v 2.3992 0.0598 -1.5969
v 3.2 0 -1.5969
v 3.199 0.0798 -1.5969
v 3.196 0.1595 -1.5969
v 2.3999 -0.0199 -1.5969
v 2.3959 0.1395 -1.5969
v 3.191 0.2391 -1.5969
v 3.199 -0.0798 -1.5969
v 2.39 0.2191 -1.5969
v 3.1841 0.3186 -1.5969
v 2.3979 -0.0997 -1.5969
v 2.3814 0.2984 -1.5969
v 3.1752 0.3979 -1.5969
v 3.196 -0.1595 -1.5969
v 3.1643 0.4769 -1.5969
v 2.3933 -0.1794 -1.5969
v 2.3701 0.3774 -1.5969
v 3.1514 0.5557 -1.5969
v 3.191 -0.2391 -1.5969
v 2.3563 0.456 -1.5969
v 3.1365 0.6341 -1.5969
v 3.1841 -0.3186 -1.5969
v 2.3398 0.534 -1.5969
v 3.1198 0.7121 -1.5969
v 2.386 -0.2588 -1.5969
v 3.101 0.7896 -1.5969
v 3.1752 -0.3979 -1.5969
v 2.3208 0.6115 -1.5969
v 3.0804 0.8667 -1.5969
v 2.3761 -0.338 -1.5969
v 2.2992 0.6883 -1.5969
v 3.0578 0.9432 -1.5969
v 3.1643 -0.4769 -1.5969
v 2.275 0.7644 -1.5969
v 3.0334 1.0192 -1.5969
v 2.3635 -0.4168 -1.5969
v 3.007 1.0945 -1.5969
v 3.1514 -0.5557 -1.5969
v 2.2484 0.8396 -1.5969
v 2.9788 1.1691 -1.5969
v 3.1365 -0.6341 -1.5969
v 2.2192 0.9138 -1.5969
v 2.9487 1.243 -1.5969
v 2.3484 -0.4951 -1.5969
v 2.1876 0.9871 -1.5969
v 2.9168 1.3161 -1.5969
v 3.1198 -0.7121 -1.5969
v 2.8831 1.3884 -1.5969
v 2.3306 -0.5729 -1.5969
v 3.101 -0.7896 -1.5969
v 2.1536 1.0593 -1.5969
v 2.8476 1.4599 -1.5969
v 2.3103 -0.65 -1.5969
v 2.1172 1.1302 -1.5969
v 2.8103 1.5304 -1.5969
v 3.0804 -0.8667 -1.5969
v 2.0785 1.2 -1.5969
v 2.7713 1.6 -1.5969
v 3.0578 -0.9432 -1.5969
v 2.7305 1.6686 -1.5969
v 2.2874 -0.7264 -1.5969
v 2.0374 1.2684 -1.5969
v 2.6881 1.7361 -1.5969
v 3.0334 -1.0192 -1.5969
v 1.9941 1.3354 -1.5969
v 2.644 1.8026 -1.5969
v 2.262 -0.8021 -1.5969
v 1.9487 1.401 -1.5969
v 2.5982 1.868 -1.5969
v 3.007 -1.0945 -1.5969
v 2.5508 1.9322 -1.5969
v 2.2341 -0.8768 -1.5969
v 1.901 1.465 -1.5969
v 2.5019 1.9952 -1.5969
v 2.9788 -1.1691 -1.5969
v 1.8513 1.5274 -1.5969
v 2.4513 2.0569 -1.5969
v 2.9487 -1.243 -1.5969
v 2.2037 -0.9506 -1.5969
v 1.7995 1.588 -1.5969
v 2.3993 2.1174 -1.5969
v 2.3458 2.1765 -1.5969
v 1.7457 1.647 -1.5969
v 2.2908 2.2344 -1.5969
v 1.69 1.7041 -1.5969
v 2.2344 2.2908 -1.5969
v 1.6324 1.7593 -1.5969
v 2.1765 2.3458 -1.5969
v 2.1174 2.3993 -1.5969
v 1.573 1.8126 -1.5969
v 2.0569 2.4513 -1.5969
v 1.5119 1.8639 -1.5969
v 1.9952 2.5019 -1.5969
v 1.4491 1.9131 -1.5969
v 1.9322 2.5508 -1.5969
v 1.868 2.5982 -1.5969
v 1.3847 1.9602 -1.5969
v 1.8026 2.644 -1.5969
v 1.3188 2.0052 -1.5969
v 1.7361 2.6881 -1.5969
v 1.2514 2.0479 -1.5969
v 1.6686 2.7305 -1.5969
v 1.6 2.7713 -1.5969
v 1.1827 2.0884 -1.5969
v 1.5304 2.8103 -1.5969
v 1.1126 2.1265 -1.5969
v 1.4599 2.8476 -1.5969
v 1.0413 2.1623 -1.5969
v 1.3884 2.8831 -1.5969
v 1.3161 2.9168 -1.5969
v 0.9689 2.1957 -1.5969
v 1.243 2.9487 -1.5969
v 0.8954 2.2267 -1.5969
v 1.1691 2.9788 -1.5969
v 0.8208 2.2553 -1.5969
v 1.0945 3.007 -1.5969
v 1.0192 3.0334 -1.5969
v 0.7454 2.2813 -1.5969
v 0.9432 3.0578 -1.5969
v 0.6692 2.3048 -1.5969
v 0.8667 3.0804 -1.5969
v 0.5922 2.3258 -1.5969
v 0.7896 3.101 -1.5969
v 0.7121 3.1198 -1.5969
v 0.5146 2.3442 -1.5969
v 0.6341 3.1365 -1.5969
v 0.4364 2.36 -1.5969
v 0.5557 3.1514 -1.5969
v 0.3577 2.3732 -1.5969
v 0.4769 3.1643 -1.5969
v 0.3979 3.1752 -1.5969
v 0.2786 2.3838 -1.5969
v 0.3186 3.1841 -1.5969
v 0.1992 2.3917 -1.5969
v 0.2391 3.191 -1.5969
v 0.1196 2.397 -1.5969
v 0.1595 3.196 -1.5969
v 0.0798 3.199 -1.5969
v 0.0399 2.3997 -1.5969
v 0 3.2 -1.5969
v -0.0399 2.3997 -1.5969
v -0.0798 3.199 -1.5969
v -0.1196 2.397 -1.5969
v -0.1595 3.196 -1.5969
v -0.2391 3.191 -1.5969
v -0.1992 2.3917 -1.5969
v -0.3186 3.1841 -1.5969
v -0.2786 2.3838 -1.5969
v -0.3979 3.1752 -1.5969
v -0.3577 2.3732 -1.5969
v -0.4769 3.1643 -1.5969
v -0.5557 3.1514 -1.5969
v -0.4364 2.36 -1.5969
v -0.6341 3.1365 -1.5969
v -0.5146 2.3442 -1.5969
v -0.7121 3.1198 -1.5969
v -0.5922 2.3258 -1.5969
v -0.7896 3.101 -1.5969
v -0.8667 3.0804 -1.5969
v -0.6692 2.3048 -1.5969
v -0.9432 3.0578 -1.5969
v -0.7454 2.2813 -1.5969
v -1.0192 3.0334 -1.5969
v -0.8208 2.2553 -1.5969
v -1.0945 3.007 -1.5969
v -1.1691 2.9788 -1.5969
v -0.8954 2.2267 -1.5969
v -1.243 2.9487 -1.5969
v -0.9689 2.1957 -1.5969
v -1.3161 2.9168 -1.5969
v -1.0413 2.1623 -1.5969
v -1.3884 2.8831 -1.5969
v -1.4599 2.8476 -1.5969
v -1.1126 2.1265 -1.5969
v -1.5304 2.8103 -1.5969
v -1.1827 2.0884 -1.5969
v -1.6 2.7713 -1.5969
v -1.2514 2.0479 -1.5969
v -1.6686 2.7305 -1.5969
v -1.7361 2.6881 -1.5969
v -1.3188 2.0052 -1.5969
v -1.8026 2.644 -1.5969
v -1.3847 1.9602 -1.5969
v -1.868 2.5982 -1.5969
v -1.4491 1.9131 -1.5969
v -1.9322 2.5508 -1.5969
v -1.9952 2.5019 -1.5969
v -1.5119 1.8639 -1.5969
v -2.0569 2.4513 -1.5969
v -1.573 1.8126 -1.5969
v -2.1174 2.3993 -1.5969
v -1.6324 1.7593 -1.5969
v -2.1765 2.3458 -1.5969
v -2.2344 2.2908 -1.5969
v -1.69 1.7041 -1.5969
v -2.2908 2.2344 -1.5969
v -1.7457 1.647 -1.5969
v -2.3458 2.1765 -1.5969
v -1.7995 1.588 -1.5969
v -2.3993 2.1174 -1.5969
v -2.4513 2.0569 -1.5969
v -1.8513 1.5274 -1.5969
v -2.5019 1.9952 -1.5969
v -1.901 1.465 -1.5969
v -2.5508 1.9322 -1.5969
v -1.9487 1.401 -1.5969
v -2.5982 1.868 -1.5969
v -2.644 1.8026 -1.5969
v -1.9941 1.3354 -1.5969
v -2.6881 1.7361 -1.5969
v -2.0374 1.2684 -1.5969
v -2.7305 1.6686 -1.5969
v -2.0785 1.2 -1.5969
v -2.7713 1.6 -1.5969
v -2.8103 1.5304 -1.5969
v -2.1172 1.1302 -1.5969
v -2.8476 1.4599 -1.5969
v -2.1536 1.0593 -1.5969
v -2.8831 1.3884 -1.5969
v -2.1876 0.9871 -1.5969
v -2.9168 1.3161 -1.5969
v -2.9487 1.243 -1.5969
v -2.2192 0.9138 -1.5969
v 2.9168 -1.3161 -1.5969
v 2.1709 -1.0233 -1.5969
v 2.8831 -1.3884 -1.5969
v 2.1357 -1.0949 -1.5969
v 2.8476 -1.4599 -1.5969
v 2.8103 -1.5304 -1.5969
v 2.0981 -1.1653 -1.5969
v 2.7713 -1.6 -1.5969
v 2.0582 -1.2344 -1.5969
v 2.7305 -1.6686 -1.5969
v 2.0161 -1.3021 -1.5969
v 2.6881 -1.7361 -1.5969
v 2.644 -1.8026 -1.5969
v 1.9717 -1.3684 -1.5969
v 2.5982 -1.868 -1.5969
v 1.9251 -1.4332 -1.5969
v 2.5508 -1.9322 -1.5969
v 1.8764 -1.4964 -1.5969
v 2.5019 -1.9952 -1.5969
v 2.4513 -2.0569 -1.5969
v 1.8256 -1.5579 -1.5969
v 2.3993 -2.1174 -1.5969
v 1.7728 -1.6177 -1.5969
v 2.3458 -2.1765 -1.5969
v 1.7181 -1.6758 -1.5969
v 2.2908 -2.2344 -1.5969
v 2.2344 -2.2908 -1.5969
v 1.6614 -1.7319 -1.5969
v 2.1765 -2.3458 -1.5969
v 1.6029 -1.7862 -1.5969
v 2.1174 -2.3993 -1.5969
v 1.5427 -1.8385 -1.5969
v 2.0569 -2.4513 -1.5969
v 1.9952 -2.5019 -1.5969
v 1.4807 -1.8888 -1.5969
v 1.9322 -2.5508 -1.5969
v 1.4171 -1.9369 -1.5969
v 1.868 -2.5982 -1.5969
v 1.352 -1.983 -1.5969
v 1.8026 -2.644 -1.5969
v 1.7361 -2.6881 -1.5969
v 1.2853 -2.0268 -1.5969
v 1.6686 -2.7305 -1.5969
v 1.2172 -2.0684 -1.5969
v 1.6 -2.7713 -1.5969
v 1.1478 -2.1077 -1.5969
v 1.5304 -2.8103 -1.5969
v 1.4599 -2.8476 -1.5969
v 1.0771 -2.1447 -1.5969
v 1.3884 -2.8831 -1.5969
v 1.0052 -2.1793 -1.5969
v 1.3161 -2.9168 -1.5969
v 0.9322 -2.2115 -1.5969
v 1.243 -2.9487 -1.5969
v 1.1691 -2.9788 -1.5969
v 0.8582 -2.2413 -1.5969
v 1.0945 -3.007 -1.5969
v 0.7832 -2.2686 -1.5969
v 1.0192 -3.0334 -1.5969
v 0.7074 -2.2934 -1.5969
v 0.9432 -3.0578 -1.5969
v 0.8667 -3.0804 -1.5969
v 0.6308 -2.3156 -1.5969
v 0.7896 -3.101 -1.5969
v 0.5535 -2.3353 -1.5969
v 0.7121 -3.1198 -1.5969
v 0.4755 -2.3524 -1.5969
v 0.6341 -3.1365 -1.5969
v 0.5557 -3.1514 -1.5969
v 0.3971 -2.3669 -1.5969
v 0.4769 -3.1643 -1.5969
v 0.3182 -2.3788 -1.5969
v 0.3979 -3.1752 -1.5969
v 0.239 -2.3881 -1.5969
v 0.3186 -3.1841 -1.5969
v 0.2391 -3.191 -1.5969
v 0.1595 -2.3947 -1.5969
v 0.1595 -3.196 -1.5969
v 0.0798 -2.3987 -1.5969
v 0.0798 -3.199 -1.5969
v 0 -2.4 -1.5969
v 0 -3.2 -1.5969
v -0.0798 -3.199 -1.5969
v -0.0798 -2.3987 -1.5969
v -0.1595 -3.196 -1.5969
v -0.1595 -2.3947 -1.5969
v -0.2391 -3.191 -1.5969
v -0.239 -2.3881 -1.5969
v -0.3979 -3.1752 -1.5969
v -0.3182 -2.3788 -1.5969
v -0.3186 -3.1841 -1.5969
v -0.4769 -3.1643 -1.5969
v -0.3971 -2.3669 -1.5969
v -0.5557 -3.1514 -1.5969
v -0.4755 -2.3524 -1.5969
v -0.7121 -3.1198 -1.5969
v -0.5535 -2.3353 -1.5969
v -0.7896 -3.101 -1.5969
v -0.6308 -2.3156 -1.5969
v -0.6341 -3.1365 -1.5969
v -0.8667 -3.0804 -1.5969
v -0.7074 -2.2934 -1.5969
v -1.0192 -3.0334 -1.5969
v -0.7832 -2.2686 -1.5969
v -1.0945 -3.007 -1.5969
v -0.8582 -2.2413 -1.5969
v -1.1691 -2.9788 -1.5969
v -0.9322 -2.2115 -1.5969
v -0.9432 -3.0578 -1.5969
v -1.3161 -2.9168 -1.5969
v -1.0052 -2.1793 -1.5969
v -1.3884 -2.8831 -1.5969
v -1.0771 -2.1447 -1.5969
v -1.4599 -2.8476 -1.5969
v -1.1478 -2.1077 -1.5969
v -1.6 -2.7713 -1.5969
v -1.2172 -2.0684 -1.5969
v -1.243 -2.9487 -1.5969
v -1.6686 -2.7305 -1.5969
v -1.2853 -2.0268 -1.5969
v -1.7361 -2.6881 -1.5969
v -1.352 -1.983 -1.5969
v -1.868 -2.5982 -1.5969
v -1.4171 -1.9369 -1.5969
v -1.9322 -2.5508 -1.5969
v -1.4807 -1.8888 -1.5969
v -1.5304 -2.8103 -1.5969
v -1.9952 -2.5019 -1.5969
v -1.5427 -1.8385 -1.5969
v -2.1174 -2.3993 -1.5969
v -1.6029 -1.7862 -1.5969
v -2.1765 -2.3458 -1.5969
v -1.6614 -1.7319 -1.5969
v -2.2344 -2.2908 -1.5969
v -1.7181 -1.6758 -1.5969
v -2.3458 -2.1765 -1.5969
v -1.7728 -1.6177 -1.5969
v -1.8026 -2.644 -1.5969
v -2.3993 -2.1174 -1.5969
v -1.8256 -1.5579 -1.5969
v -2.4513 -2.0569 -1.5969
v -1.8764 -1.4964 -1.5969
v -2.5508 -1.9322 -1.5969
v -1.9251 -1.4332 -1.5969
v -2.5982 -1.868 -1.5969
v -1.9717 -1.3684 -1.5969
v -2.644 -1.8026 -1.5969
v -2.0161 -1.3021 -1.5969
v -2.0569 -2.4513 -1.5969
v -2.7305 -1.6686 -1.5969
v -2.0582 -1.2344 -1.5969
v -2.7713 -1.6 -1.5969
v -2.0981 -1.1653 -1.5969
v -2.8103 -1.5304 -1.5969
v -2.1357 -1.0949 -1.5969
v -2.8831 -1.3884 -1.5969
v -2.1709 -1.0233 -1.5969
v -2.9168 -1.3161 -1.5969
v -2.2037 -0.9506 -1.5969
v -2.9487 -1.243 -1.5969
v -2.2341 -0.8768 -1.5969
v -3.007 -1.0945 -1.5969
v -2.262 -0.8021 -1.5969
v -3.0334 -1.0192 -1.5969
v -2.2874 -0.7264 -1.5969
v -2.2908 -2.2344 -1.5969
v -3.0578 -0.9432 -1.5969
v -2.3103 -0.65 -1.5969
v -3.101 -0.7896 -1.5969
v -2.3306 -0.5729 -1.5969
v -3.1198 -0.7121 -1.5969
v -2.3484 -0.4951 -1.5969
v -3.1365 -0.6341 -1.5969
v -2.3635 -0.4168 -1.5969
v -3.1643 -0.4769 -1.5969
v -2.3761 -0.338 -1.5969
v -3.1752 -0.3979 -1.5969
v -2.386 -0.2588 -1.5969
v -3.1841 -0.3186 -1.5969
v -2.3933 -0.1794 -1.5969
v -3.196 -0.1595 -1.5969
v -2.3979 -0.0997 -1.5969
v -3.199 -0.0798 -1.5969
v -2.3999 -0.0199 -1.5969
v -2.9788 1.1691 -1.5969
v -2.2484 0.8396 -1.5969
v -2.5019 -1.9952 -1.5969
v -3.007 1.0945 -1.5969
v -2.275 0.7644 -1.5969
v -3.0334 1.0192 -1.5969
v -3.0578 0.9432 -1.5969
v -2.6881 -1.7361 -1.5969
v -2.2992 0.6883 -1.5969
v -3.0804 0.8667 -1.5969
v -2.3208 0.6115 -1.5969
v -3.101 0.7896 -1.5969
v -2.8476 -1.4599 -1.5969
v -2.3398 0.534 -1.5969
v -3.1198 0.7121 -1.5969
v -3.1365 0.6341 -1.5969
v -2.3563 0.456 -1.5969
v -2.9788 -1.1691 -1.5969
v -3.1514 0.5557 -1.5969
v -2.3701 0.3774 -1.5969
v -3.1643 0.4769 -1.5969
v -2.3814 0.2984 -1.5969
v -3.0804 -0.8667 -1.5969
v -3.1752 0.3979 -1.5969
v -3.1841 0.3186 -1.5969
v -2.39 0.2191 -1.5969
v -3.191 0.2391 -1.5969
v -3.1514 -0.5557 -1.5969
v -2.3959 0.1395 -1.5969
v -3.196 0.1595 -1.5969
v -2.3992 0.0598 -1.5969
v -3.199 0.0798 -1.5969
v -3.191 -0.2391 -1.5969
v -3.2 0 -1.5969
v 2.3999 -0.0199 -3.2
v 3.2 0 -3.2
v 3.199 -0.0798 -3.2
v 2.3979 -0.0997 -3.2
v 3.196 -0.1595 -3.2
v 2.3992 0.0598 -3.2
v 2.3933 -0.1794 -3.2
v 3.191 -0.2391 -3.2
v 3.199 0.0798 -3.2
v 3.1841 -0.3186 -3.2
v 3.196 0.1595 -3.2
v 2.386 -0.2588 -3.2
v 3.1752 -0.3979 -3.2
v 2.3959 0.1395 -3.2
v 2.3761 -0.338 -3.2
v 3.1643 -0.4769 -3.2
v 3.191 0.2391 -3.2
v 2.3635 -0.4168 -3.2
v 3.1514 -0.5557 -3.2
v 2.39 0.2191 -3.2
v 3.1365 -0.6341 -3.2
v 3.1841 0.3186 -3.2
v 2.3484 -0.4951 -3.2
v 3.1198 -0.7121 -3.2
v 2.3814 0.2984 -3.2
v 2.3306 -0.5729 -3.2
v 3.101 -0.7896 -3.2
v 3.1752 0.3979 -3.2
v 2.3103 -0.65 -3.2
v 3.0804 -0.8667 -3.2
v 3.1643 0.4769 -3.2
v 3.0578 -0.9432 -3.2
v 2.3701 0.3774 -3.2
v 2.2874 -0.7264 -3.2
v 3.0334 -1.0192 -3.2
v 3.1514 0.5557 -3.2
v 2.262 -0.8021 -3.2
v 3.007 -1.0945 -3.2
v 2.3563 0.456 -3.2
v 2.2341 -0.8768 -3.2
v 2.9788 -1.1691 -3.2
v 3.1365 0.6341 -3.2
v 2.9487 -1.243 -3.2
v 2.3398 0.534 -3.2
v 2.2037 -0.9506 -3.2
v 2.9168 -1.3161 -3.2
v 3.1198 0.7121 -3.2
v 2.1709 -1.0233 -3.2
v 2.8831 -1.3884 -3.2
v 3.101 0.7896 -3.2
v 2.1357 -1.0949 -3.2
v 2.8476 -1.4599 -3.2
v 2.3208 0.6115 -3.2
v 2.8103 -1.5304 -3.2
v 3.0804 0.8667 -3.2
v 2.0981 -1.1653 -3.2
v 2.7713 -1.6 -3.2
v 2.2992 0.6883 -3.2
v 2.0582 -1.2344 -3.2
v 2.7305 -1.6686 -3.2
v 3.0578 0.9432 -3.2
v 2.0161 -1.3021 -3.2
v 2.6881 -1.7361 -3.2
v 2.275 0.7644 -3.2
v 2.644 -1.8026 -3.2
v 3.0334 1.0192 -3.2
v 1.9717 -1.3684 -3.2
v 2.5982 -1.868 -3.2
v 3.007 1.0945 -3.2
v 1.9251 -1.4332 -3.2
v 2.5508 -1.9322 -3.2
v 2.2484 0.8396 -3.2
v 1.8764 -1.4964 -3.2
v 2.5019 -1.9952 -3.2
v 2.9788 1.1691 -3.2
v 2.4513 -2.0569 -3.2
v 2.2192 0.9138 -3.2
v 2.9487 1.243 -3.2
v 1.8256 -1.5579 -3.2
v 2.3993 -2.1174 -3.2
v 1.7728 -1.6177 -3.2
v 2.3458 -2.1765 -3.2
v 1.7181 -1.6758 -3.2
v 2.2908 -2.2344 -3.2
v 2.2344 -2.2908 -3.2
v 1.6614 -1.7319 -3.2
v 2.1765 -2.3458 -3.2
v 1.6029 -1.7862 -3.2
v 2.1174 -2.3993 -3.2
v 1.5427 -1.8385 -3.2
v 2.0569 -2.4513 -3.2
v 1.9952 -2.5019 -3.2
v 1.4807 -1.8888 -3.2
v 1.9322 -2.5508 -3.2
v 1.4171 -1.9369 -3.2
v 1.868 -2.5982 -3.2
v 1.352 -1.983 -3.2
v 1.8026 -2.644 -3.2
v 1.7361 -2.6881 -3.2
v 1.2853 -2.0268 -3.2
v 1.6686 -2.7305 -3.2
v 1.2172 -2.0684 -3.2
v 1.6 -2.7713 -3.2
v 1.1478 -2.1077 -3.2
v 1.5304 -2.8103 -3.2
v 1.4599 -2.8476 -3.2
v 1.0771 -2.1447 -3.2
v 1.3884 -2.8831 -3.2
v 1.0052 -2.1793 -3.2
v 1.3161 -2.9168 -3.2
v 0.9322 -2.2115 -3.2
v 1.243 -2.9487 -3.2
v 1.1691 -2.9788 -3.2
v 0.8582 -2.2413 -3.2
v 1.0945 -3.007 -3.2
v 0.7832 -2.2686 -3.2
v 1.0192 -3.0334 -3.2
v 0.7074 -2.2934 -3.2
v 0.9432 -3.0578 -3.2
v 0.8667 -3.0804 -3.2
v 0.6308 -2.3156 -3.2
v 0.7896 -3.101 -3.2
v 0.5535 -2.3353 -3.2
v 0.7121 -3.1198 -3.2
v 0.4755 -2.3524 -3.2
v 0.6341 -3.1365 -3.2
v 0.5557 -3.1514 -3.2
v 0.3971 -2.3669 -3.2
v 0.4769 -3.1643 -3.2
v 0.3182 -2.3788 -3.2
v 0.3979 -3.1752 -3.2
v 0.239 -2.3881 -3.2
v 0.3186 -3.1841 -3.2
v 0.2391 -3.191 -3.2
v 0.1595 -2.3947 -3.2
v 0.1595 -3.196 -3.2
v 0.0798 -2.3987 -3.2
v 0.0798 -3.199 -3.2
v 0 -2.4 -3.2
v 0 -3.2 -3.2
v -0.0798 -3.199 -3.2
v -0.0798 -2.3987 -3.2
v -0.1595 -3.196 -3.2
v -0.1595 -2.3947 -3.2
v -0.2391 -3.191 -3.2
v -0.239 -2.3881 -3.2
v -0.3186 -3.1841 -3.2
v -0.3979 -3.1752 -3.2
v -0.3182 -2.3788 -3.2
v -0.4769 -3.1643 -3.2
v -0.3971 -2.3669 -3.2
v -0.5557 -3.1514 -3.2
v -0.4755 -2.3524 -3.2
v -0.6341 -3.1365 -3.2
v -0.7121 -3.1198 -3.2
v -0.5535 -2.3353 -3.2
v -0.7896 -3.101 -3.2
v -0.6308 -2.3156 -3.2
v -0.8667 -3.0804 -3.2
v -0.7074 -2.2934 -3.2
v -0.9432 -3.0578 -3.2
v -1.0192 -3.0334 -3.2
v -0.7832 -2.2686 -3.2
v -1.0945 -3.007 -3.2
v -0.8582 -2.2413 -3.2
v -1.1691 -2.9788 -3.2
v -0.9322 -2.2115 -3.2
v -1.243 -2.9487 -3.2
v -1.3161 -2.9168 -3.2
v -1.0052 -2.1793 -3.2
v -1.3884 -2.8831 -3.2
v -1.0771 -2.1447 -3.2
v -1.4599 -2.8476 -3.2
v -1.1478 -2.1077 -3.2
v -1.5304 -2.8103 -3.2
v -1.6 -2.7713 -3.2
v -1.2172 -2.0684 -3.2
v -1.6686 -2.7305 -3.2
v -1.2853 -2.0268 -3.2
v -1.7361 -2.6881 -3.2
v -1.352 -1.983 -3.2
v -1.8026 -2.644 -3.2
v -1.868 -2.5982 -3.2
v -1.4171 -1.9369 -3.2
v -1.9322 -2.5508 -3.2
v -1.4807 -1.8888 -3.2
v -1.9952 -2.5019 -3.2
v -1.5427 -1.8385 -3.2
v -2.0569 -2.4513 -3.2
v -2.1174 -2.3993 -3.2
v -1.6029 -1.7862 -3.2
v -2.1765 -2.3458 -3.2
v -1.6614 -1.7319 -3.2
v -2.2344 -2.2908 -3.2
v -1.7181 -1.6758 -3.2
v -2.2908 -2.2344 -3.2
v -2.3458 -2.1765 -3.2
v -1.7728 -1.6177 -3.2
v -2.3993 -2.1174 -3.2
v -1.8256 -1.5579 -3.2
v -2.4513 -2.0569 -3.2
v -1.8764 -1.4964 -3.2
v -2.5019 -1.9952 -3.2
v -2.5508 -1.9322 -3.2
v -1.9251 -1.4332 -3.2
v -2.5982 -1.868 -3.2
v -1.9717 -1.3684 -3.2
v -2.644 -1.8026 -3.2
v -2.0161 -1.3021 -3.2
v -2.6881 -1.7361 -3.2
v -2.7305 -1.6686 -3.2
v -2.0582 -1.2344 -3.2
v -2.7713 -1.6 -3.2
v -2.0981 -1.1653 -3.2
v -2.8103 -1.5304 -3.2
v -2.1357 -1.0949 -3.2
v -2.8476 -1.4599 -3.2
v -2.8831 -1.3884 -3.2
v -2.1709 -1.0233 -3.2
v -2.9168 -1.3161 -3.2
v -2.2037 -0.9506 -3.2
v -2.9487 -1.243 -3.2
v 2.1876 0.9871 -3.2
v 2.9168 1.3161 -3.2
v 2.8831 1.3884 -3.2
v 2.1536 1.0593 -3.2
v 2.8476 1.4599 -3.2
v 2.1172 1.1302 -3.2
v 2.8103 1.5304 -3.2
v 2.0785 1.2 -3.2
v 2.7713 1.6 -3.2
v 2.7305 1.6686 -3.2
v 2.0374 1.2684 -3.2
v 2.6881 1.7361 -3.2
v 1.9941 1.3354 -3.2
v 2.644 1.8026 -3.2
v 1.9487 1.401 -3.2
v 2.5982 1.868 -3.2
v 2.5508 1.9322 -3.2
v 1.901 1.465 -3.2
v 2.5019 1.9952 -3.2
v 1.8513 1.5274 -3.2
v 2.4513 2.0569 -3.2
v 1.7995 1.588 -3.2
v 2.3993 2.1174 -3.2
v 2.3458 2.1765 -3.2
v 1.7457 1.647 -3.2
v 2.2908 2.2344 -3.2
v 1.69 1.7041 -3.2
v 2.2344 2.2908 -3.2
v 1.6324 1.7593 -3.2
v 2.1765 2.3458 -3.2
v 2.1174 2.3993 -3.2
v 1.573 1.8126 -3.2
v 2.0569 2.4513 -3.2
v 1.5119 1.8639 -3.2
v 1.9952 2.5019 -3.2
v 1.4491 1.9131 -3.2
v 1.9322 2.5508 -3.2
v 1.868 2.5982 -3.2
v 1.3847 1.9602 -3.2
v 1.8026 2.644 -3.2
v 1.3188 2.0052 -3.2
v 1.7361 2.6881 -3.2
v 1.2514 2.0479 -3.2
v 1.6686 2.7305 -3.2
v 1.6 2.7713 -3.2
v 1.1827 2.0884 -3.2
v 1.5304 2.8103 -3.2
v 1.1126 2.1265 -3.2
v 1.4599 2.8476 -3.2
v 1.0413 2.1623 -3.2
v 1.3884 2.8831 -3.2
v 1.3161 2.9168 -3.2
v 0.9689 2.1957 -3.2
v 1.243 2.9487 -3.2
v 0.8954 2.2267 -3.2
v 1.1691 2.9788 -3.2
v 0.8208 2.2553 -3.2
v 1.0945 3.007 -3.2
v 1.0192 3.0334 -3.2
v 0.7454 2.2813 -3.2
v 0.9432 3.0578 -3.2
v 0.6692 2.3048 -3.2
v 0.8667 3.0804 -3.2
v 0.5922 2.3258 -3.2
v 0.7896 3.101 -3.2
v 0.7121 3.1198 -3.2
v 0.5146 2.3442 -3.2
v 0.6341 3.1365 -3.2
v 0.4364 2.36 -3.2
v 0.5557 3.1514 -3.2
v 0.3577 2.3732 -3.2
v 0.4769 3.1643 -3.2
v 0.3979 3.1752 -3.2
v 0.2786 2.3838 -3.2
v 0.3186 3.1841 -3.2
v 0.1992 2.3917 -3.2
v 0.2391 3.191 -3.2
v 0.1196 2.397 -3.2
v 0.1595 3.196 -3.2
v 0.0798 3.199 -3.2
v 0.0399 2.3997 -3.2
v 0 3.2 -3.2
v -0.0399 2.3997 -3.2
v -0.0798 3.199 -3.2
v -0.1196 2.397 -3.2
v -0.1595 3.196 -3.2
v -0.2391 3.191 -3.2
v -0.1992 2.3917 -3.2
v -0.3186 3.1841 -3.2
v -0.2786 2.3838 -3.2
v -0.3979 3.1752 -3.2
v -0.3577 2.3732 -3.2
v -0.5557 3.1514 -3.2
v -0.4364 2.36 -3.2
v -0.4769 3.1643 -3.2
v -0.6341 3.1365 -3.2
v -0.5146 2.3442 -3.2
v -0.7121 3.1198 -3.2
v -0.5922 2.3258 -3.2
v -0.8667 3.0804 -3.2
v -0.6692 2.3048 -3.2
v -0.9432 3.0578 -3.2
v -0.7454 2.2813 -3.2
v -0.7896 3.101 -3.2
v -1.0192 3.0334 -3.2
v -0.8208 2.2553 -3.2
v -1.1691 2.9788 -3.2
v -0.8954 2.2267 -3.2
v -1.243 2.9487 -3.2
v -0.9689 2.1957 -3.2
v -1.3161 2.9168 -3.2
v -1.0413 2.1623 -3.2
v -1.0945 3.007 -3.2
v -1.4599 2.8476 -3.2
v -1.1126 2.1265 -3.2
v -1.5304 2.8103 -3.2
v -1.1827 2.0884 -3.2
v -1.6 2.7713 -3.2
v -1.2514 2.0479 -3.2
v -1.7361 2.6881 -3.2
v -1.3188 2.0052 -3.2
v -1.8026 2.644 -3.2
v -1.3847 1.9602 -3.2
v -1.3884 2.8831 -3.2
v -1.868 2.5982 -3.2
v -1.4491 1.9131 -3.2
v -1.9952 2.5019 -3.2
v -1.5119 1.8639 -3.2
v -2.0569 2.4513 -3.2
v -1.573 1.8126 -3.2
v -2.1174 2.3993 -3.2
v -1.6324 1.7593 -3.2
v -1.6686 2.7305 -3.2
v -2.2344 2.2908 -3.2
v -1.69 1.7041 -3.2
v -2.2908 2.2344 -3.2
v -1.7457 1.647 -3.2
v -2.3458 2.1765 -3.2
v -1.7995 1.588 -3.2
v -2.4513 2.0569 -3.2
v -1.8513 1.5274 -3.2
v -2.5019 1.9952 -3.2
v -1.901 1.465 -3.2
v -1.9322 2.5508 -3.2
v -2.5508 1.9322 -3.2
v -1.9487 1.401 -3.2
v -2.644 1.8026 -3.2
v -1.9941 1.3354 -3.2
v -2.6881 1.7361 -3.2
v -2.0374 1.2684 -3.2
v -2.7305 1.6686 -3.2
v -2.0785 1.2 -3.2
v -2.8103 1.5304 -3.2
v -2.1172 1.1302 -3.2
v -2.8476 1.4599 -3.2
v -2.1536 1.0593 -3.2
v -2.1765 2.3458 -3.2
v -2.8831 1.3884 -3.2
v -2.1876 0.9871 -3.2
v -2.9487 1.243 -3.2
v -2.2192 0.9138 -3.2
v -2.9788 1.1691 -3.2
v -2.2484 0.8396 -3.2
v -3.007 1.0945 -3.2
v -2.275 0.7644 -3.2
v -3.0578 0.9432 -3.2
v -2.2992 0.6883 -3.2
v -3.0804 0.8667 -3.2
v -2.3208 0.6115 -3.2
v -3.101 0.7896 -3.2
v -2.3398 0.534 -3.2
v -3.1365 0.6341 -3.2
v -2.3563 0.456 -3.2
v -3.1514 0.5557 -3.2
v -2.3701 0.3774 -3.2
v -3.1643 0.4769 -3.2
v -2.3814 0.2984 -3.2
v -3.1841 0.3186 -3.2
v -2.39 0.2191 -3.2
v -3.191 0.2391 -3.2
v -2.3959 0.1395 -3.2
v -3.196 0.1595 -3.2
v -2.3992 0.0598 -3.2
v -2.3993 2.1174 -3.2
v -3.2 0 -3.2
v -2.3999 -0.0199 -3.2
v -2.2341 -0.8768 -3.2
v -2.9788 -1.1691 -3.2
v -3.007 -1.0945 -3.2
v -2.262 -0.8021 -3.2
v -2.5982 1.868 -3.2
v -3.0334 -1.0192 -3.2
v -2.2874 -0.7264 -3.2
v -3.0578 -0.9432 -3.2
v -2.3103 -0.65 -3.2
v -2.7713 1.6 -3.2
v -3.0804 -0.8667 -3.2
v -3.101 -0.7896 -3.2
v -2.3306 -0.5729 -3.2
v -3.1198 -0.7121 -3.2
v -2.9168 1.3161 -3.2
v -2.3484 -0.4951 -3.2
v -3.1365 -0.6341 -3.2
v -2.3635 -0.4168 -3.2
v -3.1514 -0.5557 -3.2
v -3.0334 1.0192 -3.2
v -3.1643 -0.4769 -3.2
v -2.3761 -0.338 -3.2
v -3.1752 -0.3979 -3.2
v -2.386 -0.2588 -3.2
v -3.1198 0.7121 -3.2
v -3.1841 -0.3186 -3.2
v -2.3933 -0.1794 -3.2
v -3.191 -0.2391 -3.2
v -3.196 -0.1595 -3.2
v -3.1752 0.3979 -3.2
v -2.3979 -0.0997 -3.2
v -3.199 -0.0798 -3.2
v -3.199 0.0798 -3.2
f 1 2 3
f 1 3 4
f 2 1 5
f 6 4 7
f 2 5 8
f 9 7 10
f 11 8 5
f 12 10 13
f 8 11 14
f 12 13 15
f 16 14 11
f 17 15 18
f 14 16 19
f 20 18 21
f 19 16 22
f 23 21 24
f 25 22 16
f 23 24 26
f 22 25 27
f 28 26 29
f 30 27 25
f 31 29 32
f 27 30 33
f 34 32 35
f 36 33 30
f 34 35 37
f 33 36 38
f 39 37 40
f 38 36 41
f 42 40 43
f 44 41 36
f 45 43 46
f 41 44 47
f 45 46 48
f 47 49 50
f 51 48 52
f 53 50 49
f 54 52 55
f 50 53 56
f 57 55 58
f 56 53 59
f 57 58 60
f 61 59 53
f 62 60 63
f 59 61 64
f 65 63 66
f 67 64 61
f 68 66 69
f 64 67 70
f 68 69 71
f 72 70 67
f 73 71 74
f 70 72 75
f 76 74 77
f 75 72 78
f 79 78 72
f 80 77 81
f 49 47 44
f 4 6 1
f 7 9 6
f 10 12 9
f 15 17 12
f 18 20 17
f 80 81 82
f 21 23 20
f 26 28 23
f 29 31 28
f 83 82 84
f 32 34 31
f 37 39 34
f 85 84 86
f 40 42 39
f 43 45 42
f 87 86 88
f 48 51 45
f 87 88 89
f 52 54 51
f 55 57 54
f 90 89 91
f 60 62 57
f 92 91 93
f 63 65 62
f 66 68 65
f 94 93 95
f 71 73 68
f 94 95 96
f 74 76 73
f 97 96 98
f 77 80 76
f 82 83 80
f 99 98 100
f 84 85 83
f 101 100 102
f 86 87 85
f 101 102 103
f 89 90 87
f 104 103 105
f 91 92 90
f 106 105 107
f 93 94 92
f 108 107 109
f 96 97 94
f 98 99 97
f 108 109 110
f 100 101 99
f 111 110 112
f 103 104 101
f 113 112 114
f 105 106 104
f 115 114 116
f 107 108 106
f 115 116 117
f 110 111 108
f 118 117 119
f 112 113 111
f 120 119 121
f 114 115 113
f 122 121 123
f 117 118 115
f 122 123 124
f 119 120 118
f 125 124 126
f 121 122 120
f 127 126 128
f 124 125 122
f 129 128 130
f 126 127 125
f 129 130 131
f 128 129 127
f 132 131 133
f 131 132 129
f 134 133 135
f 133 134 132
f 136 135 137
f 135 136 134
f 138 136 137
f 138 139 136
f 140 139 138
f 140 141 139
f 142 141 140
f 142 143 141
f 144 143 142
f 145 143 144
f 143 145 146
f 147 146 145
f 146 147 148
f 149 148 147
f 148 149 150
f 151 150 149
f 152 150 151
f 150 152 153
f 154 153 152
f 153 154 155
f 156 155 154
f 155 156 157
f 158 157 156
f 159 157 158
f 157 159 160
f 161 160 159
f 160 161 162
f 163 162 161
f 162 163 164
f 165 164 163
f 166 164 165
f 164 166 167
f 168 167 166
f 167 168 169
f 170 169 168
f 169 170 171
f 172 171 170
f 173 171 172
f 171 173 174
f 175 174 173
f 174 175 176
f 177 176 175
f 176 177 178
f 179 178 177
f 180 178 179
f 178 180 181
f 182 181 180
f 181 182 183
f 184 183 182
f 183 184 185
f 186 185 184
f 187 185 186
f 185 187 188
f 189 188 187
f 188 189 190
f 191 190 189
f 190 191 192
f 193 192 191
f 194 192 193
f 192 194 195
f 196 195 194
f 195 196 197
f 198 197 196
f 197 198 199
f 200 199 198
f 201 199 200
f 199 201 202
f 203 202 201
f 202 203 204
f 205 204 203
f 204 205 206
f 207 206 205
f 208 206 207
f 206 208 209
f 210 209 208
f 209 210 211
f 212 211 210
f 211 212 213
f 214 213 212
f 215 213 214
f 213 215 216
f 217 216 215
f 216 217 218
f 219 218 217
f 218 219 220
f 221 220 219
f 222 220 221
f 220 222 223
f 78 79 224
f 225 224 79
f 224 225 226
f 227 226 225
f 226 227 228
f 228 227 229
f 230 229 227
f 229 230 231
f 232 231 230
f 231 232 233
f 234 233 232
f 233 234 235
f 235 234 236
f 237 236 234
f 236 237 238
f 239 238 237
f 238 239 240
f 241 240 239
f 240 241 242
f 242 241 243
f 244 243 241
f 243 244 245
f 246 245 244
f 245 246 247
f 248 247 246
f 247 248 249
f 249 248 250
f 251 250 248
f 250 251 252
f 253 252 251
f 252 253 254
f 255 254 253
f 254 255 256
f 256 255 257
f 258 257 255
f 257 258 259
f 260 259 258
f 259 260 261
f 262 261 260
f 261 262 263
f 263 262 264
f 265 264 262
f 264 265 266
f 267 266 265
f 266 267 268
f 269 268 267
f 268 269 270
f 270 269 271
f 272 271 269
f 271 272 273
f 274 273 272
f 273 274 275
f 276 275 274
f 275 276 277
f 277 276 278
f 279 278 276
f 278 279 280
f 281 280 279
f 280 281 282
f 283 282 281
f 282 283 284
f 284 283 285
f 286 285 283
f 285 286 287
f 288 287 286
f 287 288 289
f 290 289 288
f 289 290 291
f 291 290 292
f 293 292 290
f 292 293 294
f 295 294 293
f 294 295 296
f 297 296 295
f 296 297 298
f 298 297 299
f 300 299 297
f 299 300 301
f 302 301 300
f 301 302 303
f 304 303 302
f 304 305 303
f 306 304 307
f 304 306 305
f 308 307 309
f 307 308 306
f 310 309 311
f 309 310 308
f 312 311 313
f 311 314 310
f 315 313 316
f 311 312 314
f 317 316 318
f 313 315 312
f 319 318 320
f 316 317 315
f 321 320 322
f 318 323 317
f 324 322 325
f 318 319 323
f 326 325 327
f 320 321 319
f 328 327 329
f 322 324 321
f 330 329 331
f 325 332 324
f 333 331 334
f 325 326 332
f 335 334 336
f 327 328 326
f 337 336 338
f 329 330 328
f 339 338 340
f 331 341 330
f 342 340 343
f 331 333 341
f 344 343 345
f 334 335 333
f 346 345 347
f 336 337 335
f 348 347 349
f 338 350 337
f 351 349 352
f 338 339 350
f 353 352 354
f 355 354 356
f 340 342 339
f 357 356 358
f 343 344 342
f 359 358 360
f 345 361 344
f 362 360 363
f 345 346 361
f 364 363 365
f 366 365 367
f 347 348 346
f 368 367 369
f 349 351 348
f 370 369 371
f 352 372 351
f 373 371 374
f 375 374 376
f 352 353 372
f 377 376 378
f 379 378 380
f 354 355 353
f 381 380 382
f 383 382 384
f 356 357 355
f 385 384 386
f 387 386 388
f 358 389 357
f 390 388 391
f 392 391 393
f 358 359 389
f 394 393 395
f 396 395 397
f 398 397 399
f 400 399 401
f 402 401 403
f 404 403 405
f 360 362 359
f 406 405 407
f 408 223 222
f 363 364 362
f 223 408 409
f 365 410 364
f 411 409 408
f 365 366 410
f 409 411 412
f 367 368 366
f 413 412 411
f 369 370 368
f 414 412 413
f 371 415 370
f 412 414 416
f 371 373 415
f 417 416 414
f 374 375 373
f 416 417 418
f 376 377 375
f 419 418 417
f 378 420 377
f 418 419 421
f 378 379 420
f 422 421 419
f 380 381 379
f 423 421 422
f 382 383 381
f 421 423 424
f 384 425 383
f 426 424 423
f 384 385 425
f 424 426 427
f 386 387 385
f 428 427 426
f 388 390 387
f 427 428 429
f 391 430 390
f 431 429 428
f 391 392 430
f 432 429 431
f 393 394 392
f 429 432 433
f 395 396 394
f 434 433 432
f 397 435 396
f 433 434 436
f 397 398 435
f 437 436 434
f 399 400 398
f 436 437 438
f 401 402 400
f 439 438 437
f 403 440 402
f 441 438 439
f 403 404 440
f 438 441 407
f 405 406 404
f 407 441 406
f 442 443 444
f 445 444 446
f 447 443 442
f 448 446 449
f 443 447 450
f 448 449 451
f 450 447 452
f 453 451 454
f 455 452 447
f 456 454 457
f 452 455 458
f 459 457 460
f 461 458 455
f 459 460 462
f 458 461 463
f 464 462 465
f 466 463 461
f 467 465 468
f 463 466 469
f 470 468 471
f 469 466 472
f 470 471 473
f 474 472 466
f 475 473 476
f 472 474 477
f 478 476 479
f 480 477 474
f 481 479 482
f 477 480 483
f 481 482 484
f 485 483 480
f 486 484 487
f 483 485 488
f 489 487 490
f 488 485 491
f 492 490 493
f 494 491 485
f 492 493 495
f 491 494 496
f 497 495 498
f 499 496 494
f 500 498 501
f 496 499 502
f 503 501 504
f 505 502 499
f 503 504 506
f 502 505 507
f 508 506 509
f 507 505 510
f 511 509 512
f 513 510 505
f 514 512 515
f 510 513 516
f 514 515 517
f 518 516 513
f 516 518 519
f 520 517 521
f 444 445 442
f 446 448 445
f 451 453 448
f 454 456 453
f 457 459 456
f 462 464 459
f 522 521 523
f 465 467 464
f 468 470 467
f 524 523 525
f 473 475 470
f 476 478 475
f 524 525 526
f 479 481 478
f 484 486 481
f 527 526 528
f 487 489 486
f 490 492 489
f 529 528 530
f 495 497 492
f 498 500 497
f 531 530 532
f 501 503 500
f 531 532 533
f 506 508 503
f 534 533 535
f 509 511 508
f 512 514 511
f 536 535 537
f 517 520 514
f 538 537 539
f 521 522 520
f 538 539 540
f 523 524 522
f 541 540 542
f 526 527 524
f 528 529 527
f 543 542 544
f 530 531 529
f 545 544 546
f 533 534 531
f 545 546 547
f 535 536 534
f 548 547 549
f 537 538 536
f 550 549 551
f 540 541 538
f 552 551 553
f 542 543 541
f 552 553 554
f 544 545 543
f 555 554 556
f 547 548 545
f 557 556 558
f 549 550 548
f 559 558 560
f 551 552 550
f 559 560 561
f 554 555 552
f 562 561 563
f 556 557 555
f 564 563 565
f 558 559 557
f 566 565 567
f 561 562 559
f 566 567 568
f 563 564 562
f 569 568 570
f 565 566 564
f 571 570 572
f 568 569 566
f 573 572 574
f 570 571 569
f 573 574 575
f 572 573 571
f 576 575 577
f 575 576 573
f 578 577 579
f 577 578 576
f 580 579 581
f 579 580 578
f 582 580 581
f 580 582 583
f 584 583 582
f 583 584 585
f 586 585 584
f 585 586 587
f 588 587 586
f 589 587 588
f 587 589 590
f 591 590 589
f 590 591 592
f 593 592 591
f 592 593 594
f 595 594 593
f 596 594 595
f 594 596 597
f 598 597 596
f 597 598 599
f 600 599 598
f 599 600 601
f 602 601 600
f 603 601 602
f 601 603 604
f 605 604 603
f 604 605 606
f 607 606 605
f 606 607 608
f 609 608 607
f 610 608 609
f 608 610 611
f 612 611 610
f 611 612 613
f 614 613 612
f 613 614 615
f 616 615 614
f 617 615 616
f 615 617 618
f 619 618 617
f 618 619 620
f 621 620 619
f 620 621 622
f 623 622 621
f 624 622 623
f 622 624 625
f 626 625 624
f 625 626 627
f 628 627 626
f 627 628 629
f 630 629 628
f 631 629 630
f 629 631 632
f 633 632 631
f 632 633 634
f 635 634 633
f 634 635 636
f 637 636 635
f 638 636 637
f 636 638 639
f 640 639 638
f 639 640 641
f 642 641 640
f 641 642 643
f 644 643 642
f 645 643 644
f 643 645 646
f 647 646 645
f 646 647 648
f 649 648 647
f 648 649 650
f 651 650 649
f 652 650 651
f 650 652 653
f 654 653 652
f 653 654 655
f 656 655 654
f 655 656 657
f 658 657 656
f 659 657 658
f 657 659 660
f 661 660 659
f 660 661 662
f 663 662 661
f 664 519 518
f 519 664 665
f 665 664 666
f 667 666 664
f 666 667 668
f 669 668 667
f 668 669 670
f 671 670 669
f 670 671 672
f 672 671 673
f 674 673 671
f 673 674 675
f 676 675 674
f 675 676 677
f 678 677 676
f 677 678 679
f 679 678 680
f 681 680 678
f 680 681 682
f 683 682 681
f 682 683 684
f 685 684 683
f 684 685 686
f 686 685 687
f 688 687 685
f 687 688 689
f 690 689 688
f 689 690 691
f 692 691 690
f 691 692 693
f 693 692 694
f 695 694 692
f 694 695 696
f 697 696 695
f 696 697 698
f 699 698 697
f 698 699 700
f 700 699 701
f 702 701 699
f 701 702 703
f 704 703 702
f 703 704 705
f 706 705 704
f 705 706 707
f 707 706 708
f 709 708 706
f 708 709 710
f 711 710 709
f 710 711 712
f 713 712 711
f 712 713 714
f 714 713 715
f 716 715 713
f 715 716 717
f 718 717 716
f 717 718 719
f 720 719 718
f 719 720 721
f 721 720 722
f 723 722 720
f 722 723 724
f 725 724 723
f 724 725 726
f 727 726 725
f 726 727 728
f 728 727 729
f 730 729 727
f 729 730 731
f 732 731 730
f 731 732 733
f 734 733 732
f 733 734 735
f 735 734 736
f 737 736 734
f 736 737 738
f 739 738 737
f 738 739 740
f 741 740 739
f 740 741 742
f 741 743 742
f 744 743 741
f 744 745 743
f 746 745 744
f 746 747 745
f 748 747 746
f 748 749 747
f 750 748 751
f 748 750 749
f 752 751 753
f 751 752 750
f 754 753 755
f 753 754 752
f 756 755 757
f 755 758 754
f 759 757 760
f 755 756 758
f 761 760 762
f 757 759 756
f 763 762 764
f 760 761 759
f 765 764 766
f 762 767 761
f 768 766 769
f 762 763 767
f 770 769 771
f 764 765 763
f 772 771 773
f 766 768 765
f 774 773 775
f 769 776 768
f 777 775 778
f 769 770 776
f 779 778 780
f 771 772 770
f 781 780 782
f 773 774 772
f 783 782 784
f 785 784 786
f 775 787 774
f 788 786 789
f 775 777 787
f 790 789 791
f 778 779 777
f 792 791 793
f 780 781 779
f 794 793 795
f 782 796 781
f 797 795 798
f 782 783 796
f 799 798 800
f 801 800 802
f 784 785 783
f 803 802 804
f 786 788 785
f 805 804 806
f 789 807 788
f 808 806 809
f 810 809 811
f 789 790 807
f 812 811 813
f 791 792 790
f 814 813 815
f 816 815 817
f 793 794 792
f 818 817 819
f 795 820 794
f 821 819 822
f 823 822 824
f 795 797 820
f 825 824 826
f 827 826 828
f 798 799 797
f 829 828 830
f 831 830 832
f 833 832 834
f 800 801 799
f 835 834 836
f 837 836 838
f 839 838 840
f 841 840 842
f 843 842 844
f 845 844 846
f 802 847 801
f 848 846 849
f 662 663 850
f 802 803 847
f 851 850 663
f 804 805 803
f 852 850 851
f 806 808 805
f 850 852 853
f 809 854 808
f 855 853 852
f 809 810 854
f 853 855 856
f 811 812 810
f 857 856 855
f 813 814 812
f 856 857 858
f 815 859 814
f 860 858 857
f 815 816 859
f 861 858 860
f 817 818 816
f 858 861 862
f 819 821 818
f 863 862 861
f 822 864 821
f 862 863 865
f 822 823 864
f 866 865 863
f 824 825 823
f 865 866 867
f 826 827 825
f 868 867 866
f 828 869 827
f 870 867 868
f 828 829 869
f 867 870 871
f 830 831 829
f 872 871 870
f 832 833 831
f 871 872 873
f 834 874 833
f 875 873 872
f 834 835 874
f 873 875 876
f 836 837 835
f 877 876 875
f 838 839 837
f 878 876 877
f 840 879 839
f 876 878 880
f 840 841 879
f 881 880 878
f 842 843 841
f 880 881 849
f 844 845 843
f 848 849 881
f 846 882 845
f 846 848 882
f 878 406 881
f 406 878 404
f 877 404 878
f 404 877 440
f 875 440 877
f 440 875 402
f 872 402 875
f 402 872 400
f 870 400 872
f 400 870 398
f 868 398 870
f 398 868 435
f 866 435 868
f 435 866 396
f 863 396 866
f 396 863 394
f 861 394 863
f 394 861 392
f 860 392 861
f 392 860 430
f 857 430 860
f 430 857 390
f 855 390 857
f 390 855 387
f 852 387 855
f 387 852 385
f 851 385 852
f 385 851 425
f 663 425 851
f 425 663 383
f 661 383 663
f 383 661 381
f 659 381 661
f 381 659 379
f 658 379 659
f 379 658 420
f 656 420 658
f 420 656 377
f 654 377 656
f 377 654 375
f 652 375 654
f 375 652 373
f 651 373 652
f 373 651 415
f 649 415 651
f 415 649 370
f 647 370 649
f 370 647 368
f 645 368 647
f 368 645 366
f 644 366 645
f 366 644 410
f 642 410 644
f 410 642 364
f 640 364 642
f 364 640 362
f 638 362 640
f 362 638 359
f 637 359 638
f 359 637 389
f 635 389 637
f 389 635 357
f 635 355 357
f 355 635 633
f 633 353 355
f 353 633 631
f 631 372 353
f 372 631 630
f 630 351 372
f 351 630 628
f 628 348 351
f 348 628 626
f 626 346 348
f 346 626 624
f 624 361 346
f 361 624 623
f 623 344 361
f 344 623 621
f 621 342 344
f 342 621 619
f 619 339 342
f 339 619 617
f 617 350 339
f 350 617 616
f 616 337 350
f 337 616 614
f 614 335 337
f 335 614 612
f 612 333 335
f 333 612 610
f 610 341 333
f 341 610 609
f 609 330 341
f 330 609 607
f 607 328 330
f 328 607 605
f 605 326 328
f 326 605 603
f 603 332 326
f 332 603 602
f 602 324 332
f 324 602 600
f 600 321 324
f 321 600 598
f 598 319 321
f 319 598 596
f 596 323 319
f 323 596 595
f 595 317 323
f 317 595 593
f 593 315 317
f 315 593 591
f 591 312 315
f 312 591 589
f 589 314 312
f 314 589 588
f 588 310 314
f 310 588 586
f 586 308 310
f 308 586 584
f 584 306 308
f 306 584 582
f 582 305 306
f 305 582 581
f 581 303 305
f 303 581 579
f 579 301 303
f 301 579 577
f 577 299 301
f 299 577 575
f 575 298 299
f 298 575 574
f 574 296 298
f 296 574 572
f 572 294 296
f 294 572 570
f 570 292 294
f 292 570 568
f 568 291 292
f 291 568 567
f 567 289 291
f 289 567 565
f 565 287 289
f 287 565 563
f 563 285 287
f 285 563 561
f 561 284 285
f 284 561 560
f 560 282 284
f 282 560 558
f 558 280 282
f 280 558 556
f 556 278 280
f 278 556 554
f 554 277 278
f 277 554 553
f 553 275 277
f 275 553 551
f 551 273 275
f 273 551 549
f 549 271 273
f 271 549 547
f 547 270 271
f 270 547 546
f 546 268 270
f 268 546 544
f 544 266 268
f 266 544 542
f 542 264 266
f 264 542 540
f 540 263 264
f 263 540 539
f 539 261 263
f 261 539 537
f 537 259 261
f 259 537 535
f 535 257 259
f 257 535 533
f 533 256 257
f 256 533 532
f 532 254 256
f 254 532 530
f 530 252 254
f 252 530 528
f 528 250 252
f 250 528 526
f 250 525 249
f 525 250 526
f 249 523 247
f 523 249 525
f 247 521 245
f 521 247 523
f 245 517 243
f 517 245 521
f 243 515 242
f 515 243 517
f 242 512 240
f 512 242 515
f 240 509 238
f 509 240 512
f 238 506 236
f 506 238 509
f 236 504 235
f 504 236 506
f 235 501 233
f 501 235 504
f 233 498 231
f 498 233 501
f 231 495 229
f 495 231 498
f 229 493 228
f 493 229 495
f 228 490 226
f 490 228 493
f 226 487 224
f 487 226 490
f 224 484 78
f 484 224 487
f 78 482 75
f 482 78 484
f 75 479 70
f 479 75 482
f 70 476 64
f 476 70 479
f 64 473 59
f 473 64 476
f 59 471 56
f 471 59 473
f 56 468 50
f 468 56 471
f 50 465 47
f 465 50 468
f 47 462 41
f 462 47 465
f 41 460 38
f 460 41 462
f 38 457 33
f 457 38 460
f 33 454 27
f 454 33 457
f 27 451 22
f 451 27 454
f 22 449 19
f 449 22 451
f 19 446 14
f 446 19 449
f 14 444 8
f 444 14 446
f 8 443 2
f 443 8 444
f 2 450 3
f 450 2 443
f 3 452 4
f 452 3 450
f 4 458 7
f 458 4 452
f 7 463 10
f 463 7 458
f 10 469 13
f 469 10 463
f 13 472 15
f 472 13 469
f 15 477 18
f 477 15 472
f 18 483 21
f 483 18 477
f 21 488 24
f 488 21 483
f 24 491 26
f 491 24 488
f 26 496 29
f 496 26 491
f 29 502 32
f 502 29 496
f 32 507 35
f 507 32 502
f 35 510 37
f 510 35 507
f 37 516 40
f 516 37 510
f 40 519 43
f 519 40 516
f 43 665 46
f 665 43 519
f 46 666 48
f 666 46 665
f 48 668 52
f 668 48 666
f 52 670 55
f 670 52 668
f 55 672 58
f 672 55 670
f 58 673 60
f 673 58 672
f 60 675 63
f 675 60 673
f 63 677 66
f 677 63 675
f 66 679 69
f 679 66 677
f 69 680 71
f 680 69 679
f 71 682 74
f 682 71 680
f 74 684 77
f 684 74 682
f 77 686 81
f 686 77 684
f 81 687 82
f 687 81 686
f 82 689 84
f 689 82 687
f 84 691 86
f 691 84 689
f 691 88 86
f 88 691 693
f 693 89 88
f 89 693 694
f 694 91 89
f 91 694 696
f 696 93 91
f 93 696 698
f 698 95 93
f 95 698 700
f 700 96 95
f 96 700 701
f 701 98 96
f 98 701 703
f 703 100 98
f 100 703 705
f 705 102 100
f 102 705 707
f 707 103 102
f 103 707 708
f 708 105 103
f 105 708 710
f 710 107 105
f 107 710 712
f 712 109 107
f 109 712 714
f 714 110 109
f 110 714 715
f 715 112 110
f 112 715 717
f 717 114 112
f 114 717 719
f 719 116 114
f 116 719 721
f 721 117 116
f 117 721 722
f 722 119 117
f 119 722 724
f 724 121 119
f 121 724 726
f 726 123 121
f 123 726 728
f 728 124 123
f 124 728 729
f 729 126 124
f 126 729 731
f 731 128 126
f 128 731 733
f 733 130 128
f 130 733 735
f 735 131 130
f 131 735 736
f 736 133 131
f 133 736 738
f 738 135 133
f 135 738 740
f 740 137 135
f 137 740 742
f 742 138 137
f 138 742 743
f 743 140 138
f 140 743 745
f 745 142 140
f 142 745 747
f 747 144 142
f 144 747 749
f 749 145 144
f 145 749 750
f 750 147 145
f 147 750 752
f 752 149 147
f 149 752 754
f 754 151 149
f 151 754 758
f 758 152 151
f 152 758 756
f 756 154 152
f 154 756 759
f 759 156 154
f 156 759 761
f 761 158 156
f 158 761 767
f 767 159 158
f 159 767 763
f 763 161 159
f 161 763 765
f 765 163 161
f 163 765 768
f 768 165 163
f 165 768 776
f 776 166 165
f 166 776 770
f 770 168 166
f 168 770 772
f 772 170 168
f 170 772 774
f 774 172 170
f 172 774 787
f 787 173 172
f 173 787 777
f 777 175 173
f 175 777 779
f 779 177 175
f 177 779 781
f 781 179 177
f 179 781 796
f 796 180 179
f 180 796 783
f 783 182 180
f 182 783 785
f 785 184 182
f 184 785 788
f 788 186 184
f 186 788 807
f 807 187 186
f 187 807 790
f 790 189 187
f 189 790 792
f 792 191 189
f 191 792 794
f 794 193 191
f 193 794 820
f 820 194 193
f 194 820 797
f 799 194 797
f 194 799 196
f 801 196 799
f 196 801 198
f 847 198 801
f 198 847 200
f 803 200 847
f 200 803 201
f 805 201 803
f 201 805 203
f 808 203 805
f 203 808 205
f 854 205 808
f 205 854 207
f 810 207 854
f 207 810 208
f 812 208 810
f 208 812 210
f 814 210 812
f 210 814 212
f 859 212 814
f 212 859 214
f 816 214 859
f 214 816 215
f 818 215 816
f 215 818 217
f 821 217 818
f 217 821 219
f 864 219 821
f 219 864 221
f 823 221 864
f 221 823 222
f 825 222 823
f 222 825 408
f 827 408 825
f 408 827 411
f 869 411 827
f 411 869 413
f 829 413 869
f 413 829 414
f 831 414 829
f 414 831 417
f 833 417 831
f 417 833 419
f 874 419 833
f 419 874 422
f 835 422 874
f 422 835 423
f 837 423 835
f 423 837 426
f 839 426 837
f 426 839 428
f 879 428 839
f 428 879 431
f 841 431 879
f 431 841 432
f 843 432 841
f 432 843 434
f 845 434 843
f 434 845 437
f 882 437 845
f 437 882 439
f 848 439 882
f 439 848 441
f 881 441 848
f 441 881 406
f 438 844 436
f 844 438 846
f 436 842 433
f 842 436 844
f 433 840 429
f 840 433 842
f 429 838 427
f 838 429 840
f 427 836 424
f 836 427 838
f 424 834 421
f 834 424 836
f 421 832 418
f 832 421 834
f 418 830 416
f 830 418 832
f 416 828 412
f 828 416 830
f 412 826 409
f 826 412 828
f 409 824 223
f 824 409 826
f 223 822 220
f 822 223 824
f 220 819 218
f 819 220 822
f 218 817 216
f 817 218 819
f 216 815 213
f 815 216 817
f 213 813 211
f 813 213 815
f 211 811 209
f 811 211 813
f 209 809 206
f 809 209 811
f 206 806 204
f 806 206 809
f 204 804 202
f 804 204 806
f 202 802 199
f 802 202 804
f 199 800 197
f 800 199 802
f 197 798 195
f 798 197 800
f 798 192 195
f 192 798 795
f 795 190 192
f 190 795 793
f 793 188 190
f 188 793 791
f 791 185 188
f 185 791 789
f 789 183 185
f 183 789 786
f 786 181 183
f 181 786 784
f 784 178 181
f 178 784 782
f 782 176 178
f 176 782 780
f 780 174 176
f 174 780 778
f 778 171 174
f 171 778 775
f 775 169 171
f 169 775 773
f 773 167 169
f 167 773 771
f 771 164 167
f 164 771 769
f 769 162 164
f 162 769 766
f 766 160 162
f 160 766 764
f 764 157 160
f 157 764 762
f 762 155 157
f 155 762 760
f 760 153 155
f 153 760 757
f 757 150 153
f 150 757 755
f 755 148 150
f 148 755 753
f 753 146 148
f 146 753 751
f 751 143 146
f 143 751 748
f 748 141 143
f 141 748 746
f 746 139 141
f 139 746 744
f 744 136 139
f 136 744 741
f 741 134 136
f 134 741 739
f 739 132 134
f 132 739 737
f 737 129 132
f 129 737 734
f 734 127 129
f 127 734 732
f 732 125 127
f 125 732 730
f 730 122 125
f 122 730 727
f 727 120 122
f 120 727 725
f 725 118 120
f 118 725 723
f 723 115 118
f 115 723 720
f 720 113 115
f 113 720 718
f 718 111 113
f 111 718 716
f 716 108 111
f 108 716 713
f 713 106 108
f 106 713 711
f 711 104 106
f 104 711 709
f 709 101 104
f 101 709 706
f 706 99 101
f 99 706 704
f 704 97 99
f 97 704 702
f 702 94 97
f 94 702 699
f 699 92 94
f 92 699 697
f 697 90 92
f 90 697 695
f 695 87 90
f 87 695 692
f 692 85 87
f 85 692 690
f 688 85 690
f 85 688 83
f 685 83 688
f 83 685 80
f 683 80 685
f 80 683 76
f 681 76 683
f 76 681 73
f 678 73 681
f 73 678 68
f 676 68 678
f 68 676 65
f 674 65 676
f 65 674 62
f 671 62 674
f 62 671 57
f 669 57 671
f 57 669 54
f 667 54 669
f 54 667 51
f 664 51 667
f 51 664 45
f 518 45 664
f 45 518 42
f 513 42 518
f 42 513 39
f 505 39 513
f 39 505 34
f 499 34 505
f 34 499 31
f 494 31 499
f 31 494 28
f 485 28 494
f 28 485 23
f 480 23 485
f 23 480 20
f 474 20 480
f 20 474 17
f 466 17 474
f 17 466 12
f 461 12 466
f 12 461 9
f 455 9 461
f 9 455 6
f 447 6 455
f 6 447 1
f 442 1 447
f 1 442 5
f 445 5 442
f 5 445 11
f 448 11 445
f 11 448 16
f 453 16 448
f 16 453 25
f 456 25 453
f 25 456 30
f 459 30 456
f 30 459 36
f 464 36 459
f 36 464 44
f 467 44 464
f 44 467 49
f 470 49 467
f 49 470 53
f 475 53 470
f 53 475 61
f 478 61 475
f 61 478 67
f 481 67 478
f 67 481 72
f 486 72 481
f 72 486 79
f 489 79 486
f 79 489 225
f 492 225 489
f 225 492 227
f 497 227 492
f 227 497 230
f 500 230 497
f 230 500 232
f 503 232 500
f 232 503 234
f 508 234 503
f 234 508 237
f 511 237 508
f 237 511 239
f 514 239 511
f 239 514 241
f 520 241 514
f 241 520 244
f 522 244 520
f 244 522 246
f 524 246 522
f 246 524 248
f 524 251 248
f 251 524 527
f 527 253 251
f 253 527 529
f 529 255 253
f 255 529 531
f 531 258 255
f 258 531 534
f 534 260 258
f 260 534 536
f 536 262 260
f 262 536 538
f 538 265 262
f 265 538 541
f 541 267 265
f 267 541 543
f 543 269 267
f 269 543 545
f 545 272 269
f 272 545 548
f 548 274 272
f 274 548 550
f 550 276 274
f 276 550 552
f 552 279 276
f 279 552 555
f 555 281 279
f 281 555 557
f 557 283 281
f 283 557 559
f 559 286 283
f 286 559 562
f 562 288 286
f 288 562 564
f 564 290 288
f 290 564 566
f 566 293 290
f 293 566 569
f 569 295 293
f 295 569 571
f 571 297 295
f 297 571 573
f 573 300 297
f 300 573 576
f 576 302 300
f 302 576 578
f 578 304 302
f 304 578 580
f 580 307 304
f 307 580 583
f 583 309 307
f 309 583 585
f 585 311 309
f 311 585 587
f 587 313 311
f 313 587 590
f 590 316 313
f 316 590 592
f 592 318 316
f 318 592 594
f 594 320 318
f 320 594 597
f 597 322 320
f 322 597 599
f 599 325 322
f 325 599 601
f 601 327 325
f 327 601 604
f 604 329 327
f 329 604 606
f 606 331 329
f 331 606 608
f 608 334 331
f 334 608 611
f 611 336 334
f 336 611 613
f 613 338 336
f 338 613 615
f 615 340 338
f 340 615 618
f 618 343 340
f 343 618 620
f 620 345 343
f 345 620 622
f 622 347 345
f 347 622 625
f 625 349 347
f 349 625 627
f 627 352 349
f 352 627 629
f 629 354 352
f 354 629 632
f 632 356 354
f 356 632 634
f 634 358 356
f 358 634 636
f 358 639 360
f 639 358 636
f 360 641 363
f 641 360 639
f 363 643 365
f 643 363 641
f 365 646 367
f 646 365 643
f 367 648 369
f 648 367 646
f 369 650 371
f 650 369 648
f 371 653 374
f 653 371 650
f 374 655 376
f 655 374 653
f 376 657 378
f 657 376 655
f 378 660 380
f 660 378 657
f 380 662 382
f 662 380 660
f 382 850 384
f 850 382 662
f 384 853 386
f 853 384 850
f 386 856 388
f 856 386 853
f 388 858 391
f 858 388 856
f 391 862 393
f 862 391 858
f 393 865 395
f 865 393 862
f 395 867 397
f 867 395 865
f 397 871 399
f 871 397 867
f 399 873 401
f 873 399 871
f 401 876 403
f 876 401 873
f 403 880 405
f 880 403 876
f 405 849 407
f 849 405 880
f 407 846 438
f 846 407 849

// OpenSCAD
use <../lib.scad>
use <s/3068bs01.scad>
use <s/3068p69a.scad>
$fa=1; $fs=0.2;
function ldraw_lib__3068bp69(realsolid=false) = [
// 0 Tile  2 x  2 with Space Police II Pattern
// 0 Name: 3068bp69.dat
// 0 Author: Carsten Schmitz [Deckard]
// 0 !LDRAW_ORG Part UPDATE 2010-01
// 0 !LICENSE Licensed under CC BY 2.0 and CC BY 4.0 : see CAreadme.txt
// 
// 0 BFC CERTIFY CCW
  [0,"BFC","CERTIFY"],
  [0,"BFC","CCW"],
// 
// 0 !HISTORY 2003-03-12 [PTadmin] Official Update 2003-01
// 0 !HISTORY 2007-06-13 [PTadmin] Header formatted for Contributor Agreement
// 0 !HISTORY 2008-07-01 [PTadmin] Official Update 2008-01
// 0 !HISTORY 2009-10-21 [anathema] Updated due to new subpart; BFC'd
// 0 !HISTORY 2010-04-05 [PTadmin] Official Update 2010-01
// 
// 
// 1 16 0 0 0 0.1 0 0 0 1 0 0 0 0.1 s\3068p69a.dat
  [1,16,0,0,0,0.1,0,0,0,1,0,0,0,0.1, ldraw_lib__s__3068p69a(realsolid)],
// 1 16 0 0 0 1 0 0 0 1 0 0 0 1 s\3068bs01.dat
  [1,16,0,0,0,1,0,0,0,1,0,0,0,1, ldraw_lib__s__3068bs01(realsolid)],
// 4 2 -18 0 -16.4 18 0 -16.4 18 0 -14 -18 0 -14
  [4,2,-18,0,-16.4,18,0,-16.4,18,0,-14,-18,0,-14],
// 4 16 -20 0 -20 20 0 -20 18 0 -16.4 -18 0 -16.4
  [4,16,-20,0,-20,20,0,-20,18,0,-16.4,-18,0,-16.4],
// 4 4 -18 0 14 18 0 14 18 0 16.4 -18 0 16.4
  [4,4,-18,0,14,18,0,14,18,0,16.4,-18,0,16.4],
// 4 16 -18 0 16.4 18 0 16.4 20 0 20 -20 0 20
  [4,16,-18,0,16.4,18,0,16.4,20,0,20,-20,0,20],
// 4 16 -18 0 -14 -18 0 14 -20 0 20 -20 0 -20
  [4,16,-18,0,-14,-18,0,14,-20,0,20,-20,0,-20],
// 4 16 20 0 -20 20 0 20 18 0 14 18 0 -14
  [4,16,20,0,-20,20,0,20,18,0,14,18,0,-14],
// 3 16 -20 0 20 -18 0 14 -18 0 16.4
  [3,16,-20,0,20,-18,0,14,-18,0,16.4],
// 3 16 -18 0 -16.4 -18 0 -14 -20 0 -20
  [3,16,-18,0,-16.4,-18,0,-14,-20,0,-20],
// 3 16 20 0 -20 18 0 -14 18 0 -16.4
  [3,16,20,0,-20,18,0,-14,18,0,-16.4],
// 3 16 18 0 16.4 18 0 14 20 0 20
  [3,16,18,0,16.4,18,0,14,20,0,20],
// 0
];
module ldraw_lib__3068bp69(step=0, col=false, unit=2/5, alt=false, line=0.2, solid=!$preview)
    makepoly(ldraw_lib__3068bp69(solid), step=step, col=col, unit=unit, alt=alt, line=line, solid=solid);
ldraw_lib__3068bp69(line=0.2);
